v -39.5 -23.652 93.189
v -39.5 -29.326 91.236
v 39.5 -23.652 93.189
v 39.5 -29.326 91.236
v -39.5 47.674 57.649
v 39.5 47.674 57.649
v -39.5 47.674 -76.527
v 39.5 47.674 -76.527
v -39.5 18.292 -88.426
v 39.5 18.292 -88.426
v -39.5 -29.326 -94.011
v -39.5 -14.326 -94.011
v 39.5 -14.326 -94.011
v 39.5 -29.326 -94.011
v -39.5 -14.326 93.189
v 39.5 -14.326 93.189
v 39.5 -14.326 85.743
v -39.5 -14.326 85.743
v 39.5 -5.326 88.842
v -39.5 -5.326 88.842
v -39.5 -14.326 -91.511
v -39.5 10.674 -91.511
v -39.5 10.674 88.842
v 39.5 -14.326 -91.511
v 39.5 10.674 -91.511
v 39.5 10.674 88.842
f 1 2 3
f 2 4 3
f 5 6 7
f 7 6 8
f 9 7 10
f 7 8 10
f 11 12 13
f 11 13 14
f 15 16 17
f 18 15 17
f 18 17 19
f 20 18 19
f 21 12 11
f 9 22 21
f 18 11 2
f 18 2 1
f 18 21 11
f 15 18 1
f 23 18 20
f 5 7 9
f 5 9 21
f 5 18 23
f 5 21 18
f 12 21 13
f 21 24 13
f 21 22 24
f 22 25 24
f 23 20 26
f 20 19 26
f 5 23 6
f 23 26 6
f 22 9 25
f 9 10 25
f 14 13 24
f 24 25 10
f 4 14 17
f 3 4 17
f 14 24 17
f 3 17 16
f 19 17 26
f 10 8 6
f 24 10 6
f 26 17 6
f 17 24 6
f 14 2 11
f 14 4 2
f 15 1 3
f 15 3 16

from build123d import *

# Parameters (mm, degrees)
BOSS_EXTRUDE2_DEPTH = 39.5


with BuildPart() as part:
    # Sketch6 → Boss-Extrude2 (new body, symmetric)
    with BuildSketch(Plane(origin=(0, 0, 0), x_dir=(0, 0, -1), z_dir=(1, 0, 0))):
        Polygon((-85.742753648, -14.325502792), (-88.841702167, -5.325502792), (-88.841702167, 10.674497208), (-57.649472482, 47.674497208), (76.526626639, 47.674497208), (88.425634479, 18.292332188), (91.510658272, 10.674497208), (91.510658272, -14.325502792), (94.010658272, -14.325502792), (94.010658272, -29.325502792), (-80.44551992, -29.325502792), (-91.235932802, -29.325502792), (-93.189341728, -23.652391339), (-93.189341728, -14.325502792), align=None)
    extrude(amount=BOSS_EXTRUDE2_DEPTH, both=True)


solid = part.part
